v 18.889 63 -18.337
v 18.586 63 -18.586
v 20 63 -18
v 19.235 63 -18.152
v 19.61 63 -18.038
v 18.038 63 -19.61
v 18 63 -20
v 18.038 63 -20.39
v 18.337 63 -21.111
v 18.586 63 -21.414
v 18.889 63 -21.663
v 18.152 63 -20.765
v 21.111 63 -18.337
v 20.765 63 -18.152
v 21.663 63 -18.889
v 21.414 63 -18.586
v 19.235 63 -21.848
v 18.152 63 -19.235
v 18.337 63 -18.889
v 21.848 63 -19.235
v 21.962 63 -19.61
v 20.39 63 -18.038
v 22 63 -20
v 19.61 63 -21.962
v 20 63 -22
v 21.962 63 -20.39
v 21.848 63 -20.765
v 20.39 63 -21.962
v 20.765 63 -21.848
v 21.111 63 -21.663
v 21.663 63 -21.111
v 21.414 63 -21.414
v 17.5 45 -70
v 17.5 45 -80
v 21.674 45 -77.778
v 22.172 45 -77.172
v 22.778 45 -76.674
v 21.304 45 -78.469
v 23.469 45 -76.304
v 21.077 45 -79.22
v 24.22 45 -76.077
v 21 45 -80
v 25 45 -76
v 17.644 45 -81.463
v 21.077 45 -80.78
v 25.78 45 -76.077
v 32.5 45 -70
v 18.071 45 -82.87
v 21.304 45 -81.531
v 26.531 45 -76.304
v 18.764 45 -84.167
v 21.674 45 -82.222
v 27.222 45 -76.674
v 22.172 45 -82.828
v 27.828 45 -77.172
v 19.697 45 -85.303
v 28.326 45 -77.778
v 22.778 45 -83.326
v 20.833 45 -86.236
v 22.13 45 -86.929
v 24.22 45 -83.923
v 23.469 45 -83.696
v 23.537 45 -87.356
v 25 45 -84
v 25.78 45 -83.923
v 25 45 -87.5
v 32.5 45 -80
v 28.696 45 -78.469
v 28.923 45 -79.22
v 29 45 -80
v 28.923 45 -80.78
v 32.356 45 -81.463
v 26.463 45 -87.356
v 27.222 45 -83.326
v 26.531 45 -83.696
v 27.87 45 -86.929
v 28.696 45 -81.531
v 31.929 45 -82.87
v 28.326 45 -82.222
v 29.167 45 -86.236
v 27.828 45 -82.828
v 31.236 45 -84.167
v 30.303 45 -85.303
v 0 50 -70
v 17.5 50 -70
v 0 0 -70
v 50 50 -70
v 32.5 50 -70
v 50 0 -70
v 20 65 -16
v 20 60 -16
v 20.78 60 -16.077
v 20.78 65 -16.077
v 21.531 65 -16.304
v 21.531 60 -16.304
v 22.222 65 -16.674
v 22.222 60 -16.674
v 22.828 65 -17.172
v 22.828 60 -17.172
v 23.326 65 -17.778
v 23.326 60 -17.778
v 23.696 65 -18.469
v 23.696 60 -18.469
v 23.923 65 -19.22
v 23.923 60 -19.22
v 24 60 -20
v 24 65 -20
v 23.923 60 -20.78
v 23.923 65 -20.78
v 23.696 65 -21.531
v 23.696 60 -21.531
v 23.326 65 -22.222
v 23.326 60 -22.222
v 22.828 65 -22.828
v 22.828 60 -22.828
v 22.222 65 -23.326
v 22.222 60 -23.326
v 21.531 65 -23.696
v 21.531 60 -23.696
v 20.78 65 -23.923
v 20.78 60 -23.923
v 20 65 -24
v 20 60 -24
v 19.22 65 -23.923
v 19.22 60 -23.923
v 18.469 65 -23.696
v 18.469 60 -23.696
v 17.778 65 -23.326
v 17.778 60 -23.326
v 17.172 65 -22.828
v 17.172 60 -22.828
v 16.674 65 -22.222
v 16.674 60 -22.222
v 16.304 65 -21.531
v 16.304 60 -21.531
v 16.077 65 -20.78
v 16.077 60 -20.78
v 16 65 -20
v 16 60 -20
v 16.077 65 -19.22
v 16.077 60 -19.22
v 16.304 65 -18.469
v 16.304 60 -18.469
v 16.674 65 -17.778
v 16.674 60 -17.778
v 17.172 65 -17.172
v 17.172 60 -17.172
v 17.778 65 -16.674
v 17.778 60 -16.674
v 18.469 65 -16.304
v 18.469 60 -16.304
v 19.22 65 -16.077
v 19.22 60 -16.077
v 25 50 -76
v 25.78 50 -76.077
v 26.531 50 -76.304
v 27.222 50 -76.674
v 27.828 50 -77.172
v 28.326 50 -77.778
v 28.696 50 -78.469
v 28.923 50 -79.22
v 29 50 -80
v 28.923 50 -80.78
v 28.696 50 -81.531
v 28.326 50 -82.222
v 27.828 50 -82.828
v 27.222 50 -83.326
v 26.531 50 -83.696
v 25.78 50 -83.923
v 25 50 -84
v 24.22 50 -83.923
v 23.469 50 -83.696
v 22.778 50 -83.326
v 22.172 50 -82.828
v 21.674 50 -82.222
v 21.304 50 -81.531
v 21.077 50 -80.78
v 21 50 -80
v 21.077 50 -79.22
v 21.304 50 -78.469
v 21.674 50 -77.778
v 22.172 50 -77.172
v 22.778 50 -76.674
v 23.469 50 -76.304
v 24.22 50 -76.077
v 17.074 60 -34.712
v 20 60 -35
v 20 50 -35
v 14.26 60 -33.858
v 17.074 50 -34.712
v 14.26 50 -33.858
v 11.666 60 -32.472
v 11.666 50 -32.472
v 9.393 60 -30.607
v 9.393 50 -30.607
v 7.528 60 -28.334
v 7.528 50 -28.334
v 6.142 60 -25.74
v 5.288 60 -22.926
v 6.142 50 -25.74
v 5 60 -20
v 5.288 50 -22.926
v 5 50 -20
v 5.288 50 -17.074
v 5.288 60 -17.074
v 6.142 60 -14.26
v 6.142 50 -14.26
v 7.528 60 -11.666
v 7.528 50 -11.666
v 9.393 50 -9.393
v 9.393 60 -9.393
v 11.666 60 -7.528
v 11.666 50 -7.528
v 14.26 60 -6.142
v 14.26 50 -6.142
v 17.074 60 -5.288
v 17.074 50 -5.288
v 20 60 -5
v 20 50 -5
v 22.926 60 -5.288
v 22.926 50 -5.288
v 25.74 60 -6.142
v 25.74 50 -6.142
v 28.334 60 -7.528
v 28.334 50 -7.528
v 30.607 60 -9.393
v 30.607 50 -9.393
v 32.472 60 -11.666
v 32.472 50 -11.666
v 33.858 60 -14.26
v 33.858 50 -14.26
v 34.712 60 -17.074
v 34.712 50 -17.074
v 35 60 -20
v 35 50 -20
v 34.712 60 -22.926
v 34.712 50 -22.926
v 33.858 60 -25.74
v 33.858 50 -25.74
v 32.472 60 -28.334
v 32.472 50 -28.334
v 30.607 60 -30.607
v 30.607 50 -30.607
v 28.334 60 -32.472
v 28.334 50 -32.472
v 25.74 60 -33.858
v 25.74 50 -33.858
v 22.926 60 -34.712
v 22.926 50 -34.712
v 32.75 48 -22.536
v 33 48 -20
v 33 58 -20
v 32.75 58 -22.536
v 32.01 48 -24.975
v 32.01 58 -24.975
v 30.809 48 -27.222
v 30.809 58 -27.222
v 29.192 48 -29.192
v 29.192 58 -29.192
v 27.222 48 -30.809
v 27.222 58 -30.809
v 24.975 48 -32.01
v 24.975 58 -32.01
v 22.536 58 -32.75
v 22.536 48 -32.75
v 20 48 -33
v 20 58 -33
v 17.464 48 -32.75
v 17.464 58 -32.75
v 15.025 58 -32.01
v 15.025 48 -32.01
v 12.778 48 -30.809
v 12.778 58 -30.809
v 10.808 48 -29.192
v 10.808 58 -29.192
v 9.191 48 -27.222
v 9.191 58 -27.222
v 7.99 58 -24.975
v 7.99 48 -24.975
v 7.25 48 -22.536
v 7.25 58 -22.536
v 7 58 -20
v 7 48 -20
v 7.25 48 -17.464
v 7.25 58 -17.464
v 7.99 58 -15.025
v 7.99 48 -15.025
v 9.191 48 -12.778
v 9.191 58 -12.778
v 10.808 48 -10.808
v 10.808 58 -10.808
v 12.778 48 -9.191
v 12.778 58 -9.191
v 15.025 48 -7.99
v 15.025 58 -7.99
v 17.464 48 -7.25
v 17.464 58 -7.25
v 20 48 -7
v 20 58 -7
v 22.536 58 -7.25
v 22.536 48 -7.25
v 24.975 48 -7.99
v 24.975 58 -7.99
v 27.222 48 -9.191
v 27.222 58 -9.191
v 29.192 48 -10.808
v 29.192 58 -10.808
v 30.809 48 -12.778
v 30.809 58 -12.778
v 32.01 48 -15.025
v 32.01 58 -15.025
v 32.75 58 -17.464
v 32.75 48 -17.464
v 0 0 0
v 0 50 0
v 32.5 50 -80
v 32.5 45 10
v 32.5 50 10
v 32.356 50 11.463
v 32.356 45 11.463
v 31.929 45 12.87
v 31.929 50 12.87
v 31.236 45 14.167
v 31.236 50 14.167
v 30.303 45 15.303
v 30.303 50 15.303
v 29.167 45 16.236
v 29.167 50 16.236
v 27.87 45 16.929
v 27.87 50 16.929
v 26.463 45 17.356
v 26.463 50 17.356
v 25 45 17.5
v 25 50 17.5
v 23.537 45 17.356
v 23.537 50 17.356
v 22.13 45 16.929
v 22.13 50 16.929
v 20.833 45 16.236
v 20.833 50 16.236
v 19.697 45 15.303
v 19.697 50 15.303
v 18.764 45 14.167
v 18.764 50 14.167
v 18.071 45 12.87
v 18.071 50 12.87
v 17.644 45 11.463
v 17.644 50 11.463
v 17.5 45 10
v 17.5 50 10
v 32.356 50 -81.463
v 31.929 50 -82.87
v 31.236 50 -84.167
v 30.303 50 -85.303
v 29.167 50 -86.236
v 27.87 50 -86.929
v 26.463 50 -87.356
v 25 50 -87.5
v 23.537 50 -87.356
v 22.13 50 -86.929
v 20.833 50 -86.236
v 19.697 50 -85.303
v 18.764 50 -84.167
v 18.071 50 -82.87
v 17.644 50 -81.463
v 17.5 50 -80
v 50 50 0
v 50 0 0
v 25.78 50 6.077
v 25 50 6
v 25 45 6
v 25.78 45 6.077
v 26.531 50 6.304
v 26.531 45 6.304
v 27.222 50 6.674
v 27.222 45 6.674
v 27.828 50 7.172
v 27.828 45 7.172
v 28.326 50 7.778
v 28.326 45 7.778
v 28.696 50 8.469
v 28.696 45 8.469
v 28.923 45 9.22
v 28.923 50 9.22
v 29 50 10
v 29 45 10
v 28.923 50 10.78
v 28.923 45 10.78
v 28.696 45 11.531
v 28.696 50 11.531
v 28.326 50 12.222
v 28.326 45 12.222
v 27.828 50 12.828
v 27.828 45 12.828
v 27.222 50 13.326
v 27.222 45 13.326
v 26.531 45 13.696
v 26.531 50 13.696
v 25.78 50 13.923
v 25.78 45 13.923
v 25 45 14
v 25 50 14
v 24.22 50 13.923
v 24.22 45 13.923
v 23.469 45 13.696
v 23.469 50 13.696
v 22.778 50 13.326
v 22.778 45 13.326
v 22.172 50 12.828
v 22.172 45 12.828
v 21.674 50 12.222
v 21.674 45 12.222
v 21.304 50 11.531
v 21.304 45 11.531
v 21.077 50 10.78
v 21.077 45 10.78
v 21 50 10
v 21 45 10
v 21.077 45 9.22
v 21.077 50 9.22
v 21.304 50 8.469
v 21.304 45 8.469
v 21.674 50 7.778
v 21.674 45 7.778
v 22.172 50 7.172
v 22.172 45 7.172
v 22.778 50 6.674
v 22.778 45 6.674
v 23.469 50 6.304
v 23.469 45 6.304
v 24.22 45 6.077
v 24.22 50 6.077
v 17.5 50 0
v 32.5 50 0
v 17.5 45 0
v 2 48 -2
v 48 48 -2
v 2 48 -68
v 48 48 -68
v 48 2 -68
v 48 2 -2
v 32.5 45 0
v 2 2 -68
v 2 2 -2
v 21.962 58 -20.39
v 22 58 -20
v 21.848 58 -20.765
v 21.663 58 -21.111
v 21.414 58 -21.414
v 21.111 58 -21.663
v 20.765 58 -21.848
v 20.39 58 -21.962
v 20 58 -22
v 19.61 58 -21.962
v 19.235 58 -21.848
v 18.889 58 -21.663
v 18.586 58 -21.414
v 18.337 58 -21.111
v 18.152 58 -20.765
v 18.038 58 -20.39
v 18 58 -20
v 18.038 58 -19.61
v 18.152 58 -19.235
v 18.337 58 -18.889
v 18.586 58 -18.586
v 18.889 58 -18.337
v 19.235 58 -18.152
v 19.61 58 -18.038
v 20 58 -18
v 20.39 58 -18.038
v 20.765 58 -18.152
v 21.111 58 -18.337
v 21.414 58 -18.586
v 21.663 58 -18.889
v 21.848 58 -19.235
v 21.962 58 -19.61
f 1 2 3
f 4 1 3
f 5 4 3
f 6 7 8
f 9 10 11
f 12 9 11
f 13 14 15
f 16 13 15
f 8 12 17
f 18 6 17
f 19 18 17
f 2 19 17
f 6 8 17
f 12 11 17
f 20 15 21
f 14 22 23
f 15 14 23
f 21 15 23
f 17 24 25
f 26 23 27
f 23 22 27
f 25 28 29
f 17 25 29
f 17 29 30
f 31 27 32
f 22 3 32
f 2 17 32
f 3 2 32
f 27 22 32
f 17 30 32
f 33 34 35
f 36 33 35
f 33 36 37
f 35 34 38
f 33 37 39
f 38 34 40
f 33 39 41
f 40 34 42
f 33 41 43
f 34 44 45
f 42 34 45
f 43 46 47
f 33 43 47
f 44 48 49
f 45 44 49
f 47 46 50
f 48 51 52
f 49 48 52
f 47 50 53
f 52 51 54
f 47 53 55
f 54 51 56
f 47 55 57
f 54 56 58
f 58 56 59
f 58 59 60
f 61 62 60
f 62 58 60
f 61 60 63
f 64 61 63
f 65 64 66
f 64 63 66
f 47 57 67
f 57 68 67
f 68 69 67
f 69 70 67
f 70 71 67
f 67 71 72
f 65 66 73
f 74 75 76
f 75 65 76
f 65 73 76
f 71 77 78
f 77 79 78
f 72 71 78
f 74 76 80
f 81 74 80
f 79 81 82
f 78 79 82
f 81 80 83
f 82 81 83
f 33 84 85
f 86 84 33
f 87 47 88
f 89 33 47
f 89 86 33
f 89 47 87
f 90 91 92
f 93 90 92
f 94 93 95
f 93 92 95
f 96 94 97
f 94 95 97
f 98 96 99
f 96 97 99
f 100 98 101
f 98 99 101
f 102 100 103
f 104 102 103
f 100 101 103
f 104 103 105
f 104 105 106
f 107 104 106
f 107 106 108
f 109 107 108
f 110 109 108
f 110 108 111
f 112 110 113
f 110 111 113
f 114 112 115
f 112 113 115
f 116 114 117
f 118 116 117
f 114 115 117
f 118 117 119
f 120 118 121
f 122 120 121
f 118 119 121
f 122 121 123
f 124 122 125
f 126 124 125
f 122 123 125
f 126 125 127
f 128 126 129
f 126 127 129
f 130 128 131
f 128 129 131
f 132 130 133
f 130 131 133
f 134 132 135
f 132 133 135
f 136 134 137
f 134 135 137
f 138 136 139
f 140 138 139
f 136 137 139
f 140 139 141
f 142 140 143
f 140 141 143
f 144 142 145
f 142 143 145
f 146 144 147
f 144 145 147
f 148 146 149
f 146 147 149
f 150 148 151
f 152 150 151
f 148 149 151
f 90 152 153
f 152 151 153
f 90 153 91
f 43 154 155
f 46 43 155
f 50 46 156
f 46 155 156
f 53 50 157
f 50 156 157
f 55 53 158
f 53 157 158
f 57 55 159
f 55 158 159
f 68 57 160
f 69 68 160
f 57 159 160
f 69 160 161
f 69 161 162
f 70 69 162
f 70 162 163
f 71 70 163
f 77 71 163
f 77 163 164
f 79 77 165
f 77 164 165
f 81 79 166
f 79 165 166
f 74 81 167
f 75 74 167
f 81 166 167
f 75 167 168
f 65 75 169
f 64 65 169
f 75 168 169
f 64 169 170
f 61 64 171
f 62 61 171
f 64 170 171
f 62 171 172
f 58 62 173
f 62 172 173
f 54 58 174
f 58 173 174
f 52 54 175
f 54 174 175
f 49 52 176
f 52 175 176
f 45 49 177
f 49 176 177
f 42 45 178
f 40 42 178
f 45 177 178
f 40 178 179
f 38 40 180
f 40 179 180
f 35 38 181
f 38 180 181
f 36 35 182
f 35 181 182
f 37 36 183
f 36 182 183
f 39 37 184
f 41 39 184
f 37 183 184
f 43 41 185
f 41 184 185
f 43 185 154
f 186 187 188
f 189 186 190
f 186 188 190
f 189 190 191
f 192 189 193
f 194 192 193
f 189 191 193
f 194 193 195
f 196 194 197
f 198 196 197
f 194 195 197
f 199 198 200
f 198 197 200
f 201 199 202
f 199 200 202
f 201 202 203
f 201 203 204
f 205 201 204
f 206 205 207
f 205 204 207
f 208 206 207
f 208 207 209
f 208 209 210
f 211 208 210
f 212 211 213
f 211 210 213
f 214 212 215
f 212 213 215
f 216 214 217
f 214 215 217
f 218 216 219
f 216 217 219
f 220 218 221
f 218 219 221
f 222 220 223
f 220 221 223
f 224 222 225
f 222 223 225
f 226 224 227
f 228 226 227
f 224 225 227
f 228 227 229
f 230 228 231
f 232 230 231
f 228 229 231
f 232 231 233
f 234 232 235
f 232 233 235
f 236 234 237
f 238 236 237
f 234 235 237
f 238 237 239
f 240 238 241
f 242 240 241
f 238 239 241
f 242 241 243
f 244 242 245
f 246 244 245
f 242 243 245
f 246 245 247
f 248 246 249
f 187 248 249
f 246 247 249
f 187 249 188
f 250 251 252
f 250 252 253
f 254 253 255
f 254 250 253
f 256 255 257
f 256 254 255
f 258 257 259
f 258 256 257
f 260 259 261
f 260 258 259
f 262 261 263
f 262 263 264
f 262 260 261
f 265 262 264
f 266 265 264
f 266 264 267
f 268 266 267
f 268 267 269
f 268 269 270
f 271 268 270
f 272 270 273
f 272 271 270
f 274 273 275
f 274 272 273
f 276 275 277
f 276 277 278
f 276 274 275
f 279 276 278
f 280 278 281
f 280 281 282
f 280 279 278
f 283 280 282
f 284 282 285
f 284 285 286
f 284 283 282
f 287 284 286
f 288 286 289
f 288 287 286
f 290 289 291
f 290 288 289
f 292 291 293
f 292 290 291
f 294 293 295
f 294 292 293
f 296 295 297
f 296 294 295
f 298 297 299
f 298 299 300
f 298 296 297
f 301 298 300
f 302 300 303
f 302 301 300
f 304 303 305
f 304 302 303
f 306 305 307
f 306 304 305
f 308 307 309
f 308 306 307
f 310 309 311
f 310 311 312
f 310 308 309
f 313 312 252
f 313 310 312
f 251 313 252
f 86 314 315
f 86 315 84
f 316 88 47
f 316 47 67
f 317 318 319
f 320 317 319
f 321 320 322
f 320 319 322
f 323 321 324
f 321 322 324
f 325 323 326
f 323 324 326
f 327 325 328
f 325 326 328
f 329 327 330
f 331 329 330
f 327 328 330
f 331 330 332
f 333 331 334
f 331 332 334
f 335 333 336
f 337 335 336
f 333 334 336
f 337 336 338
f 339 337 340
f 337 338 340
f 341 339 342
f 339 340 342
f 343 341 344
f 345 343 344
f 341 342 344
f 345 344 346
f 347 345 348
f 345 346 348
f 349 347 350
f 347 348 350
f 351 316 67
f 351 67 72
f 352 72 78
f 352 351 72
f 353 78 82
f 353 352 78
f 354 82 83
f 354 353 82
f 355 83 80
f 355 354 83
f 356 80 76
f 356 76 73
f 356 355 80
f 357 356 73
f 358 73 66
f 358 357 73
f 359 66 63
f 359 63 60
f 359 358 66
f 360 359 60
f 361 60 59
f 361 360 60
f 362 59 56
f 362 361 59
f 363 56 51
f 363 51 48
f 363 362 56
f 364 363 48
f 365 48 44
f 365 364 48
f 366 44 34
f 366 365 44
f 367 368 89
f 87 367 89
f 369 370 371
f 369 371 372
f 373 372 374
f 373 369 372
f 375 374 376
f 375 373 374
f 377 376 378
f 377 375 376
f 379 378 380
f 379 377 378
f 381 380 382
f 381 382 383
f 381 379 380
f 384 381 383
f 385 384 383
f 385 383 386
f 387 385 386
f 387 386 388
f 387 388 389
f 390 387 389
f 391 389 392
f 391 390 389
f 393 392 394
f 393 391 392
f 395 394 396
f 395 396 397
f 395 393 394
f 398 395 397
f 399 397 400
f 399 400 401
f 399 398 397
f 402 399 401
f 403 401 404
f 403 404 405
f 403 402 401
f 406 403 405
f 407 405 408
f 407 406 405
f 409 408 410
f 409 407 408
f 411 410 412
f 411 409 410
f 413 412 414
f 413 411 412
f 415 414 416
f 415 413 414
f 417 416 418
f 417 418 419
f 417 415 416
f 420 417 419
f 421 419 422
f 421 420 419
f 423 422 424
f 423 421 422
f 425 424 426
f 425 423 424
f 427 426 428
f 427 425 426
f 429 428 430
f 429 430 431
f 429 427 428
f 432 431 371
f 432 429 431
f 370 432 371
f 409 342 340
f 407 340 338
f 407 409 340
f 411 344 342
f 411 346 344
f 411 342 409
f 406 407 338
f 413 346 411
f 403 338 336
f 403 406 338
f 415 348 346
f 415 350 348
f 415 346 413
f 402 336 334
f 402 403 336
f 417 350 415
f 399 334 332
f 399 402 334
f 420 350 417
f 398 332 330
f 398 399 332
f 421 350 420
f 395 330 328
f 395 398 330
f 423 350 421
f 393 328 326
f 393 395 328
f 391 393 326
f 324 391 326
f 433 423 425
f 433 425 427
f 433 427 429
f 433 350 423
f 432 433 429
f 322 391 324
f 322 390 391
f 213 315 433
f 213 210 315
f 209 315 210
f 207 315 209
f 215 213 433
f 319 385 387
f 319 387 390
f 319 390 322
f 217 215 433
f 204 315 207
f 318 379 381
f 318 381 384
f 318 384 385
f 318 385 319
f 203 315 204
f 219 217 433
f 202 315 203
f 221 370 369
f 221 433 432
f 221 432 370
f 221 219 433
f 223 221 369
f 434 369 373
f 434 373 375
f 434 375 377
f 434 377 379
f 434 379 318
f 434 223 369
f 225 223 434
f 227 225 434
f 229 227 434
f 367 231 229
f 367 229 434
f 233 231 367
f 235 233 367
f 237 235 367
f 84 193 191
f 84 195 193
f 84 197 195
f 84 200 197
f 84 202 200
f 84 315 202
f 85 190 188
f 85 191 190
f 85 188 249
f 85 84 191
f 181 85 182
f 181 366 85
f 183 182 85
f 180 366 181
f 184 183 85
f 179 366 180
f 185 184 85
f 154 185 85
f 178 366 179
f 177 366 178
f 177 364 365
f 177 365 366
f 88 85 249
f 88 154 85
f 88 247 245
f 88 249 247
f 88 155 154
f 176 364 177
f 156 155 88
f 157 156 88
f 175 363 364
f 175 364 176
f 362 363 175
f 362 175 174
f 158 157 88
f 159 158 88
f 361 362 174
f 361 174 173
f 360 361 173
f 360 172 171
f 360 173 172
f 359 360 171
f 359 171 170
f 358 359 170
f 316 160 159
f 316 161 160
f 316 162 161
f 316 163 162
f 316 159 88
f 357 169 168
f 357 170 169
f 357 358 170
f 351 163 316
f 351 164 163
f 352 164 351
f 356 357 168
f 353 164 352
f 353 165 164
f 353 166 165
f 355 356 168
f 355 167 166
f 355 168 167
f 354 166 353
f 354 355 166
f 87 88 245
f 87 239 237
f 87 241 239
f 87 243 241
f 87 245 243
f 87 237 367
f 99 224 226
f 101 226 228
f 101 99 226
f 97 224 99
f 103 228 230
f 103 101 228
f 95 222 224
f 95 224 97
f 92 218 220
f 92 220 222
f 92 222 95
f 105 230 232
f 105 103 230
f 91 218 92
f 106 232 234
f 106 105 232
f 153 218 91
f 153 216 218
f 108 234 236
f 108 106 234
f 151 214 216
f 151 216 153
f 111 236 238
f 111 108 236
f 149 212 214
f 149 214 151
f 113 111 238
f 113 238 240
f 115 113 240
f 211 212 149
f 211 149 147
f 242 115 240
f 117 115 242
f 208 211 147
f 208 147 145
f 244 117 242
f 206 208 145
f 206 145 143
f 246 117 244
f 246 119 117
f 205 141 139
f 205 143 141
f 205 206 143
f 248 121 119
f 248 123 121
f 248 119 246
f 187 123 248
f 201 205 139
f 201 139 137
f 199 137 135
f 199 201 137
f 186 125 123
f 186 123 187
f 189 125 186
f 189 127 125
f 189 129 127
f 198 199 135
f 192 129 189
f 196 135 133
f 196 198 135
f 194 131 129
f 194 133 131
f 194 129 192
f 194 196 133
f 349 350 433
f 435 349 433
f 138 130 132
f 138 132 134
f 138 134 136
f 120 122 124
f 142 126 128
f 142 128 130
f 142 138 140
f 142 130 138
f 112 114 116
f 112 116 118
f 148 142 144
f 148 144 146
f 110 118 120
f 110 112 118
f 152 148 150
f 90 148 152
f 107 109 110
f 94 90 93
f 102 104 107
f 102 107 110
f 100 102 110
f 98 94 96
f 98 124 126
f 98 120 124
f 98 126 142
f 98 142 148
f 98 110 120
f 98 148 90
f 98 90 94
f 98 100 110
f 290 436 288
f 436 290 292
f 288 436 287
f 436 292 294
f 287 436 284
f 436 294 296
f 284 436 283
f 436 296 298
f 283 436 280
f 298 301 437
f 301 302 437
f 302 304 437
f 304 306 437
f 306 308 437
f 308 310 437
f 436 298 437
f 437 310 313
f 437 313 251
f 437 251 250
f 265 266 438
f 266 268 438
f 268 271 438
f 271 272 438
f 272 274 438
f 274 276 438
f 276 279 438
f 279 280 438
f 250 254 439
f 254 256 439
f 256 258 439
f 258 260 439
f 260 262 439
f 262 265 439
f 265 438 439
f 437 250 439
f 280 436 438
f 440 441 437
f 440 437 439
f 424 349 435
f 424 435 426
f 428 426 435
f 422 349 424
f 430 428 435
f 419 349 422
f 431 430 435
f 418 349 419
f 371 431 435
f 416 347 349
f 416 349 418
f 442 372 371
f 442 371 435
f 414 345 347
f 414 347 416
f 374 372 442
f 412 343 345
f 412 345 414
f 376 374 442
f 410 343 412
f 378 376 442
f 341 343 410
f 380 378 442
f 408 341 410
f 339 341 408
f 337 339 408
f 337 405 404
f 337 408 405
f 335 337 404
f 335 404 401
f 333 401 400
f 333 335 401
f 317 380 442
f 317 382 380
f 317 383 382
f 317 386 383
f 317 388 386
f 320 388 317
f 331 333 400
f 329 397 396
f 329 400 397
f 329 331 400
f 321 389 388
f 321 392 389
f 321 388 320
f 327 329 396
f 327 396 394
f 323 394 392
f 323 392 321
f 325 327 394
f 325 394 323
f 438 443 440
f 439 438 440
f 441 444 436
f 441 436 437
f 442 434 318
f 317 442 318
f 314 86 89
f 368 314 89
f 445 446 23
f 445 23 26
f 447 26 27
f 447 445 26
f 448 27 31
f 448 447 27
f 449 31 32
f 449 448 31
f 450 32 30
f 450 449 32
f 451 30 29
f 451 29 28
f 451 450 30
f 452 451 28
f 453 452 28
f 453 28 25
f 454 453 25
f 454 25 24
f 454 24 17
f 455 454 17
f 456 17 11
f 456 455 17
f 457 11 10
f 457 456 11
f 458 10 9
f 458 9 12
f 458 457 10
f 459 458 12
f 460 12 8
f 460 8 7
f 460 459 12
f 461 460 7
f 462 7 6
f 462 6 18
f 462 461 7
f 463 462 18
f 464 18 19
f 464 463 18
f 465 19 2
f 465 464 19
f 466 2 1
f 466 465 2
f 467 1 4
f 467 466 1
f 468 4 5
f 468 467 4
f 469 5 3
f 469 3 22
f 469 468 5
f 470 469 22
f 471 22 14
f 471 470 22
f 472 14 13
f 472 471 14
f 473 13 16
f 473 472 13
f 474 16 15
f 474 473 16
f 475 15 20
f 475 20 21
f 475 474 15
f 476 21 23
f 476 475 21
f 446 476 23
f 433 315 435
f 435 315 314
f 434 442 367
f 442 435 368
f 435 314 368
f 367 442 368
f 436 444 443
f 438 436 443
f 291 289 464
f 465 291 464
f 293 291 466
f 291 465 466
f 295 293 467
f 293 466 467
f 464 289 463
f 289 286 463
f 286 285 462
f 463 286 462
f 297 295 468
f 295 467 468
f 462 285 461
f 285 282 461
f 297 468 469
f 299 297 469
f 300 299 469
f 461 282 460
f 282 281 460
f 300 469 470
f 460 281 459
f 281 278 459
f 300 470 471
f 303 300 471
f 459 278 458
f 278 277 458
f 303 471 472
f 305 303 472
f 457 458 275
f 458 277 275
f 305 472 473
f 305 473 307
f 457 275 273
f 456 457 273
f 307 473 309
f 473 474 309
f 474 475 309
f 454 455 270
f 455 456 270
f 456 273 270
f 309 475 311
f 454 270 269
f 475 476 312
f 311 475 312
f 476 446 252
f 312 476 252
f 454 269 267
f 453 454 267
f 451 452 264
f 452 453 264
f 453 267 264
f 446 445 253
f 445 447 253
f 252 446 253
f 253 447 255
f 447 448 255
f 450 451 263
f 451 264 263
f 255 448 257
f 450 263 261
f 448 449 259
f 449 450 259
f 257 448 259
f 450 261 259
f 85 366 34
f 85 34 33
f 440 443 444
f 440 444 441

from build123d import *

# Parameters (mm, degrees)
SKETCH1_W           = 50
SKETCH1_H           = 70
BOSS_EXTRUDE1_DEPTH = 50
SKETCH2_R           = 15
BOSS_EXTRUDE2_DEPTH = 10
SKETCH3_R           = 4
BOSS_EXTRUDE3_DEPTH = 5
SHELL7_START        = 2
SHELL7_OUTLINE_W    = 46
SHELL7_OUTLINE_H    = 66
SHELL7_DEPTH        = 46
SHELL7_START_2      = 48
SHELL7_2_OUTLINE_R  = 13
SHELL7_2_DEPTH      = 10
SHELL7_START_3      = 58
SHELL7_3_OUTLINE_R  = 2
SHELL7_3_DEPTH      = 5
SKETCH4_R           = 4
BOSS_EXTRUDE4_DEPTH = 5


# Read off the part's stored shape, not the designer's step: Shell7
with BuildPart() as part:
    # Sketch1 → Boss-Extrude1 (new body)
    with BuildSketch(Plane(origin=(0, 0, 0), x_dir=(1, 0, 0), z_dir=(0, 1, 0))):
        with Locations((25, 35)):
            Rectangle(SKETCH1_W, SKETCH1_H)
    extrude(amount=BOSS_EXTRUDE1_DEPTH)

    # Sketch2 → Boss-Extrude2 (add)
    with BuildSketch(Plane(origin=(0, 50, 0), x_dir=(1, 0, 0), z_dir=(0, 1, 0))):
        with Locations(Location((20, 20, 0), (0, 0, 90))):
            Circle(SKETCH2_R)
    extrude(amount=BOSS_EXTRUDE2_DEPTH)

    # Sketch3 → Boss-Extrude3 (add)
    with BuildSketch(Plane(origin=(0, 60, 0), x_dir=(1, 0, 0), z_dir=(0, 1, 0))):
        with Locations(Location((20, 20, 0), (0, 0, 270))):
            Circle(SKETCH3_R)
    extrude(amount=BOSS_EXTRUDE3_DEPTH)

    # Shell7 outline → Shell7 (cut)
    with BuildSketch(Plane(origin=(0, 0, 0), x_dir=(1, 0, 0), z_dir=(0, 1, 0)).offset(SHELL7_START)):
        with Locations((25, 35)):
            Rectangle(SHELL7_OUTLINE_W, SHELL7_OUTLINE_H)
    extrude(amount=SHELL7_DEPTH, mode=Mode.SUBTRACT)

    # Shell7 2 outline → Shell7 2 (cut)
    with BuildSketch(Plane(origin=(0, 0, 0), x_dir=(1, 0, 0), z_dir=(0, 1, 0)).offset(SHELL7_START_2)):
        with Locations((20, 20)):
            Circle(SHELL7_2_OUTLINE_R)
    extrude(amount=SHELL7_2_DEPTH, mode=Mode.SUBTRACT)

    # Shell7 3 outline → Shell7 3 (cut)
    with BuildSketch(Plane(origin=(0, 0, 0), x_dir=(1, 0, 0), z_dir=(0, 1, 0)).offset(SHELL7_START_3)):
        with Locations((20, 20)):
            Circle(SHELL7_3_OUTLINE_R)
    extrude(amount=SHELL7_3_DEPTH, mode=Mode.SUBTRACT)

    # Sketch4 → Boss-Extrude4 (add)
    with BuildSketch(Plane(origin=(0, 50, 0), x_dir=(1, 0, 0), z_dir=(0, 1, 0))):
        with BuildLine():
            Line((17.5, 70), (32.5, 70))
            Line((32.5, 70), (32.5, 80))
            ThreePointArc((32.5, 80), (25, 87.5), (17.5, 80))
            Line((17.5, 80), (17.5, 70))
        make_face()
        with Locations(Location((25, 80, 0), (0, 0, 270))):
            Circle(SKETCH4_R, mode=Mode.SUBTRACT)
    boss_extrude4 = extrude(amount=-BOSS_EXTRUDE4_DEPTH)

    # Mirror1: Boss-Extrude4 across plane
    add(boss_extrude4.mirror(Plane(origin=(0, 0, -35), x_dir=(1, 0, 0), z_dir=(0, 0, -1))))


solid = part.part
